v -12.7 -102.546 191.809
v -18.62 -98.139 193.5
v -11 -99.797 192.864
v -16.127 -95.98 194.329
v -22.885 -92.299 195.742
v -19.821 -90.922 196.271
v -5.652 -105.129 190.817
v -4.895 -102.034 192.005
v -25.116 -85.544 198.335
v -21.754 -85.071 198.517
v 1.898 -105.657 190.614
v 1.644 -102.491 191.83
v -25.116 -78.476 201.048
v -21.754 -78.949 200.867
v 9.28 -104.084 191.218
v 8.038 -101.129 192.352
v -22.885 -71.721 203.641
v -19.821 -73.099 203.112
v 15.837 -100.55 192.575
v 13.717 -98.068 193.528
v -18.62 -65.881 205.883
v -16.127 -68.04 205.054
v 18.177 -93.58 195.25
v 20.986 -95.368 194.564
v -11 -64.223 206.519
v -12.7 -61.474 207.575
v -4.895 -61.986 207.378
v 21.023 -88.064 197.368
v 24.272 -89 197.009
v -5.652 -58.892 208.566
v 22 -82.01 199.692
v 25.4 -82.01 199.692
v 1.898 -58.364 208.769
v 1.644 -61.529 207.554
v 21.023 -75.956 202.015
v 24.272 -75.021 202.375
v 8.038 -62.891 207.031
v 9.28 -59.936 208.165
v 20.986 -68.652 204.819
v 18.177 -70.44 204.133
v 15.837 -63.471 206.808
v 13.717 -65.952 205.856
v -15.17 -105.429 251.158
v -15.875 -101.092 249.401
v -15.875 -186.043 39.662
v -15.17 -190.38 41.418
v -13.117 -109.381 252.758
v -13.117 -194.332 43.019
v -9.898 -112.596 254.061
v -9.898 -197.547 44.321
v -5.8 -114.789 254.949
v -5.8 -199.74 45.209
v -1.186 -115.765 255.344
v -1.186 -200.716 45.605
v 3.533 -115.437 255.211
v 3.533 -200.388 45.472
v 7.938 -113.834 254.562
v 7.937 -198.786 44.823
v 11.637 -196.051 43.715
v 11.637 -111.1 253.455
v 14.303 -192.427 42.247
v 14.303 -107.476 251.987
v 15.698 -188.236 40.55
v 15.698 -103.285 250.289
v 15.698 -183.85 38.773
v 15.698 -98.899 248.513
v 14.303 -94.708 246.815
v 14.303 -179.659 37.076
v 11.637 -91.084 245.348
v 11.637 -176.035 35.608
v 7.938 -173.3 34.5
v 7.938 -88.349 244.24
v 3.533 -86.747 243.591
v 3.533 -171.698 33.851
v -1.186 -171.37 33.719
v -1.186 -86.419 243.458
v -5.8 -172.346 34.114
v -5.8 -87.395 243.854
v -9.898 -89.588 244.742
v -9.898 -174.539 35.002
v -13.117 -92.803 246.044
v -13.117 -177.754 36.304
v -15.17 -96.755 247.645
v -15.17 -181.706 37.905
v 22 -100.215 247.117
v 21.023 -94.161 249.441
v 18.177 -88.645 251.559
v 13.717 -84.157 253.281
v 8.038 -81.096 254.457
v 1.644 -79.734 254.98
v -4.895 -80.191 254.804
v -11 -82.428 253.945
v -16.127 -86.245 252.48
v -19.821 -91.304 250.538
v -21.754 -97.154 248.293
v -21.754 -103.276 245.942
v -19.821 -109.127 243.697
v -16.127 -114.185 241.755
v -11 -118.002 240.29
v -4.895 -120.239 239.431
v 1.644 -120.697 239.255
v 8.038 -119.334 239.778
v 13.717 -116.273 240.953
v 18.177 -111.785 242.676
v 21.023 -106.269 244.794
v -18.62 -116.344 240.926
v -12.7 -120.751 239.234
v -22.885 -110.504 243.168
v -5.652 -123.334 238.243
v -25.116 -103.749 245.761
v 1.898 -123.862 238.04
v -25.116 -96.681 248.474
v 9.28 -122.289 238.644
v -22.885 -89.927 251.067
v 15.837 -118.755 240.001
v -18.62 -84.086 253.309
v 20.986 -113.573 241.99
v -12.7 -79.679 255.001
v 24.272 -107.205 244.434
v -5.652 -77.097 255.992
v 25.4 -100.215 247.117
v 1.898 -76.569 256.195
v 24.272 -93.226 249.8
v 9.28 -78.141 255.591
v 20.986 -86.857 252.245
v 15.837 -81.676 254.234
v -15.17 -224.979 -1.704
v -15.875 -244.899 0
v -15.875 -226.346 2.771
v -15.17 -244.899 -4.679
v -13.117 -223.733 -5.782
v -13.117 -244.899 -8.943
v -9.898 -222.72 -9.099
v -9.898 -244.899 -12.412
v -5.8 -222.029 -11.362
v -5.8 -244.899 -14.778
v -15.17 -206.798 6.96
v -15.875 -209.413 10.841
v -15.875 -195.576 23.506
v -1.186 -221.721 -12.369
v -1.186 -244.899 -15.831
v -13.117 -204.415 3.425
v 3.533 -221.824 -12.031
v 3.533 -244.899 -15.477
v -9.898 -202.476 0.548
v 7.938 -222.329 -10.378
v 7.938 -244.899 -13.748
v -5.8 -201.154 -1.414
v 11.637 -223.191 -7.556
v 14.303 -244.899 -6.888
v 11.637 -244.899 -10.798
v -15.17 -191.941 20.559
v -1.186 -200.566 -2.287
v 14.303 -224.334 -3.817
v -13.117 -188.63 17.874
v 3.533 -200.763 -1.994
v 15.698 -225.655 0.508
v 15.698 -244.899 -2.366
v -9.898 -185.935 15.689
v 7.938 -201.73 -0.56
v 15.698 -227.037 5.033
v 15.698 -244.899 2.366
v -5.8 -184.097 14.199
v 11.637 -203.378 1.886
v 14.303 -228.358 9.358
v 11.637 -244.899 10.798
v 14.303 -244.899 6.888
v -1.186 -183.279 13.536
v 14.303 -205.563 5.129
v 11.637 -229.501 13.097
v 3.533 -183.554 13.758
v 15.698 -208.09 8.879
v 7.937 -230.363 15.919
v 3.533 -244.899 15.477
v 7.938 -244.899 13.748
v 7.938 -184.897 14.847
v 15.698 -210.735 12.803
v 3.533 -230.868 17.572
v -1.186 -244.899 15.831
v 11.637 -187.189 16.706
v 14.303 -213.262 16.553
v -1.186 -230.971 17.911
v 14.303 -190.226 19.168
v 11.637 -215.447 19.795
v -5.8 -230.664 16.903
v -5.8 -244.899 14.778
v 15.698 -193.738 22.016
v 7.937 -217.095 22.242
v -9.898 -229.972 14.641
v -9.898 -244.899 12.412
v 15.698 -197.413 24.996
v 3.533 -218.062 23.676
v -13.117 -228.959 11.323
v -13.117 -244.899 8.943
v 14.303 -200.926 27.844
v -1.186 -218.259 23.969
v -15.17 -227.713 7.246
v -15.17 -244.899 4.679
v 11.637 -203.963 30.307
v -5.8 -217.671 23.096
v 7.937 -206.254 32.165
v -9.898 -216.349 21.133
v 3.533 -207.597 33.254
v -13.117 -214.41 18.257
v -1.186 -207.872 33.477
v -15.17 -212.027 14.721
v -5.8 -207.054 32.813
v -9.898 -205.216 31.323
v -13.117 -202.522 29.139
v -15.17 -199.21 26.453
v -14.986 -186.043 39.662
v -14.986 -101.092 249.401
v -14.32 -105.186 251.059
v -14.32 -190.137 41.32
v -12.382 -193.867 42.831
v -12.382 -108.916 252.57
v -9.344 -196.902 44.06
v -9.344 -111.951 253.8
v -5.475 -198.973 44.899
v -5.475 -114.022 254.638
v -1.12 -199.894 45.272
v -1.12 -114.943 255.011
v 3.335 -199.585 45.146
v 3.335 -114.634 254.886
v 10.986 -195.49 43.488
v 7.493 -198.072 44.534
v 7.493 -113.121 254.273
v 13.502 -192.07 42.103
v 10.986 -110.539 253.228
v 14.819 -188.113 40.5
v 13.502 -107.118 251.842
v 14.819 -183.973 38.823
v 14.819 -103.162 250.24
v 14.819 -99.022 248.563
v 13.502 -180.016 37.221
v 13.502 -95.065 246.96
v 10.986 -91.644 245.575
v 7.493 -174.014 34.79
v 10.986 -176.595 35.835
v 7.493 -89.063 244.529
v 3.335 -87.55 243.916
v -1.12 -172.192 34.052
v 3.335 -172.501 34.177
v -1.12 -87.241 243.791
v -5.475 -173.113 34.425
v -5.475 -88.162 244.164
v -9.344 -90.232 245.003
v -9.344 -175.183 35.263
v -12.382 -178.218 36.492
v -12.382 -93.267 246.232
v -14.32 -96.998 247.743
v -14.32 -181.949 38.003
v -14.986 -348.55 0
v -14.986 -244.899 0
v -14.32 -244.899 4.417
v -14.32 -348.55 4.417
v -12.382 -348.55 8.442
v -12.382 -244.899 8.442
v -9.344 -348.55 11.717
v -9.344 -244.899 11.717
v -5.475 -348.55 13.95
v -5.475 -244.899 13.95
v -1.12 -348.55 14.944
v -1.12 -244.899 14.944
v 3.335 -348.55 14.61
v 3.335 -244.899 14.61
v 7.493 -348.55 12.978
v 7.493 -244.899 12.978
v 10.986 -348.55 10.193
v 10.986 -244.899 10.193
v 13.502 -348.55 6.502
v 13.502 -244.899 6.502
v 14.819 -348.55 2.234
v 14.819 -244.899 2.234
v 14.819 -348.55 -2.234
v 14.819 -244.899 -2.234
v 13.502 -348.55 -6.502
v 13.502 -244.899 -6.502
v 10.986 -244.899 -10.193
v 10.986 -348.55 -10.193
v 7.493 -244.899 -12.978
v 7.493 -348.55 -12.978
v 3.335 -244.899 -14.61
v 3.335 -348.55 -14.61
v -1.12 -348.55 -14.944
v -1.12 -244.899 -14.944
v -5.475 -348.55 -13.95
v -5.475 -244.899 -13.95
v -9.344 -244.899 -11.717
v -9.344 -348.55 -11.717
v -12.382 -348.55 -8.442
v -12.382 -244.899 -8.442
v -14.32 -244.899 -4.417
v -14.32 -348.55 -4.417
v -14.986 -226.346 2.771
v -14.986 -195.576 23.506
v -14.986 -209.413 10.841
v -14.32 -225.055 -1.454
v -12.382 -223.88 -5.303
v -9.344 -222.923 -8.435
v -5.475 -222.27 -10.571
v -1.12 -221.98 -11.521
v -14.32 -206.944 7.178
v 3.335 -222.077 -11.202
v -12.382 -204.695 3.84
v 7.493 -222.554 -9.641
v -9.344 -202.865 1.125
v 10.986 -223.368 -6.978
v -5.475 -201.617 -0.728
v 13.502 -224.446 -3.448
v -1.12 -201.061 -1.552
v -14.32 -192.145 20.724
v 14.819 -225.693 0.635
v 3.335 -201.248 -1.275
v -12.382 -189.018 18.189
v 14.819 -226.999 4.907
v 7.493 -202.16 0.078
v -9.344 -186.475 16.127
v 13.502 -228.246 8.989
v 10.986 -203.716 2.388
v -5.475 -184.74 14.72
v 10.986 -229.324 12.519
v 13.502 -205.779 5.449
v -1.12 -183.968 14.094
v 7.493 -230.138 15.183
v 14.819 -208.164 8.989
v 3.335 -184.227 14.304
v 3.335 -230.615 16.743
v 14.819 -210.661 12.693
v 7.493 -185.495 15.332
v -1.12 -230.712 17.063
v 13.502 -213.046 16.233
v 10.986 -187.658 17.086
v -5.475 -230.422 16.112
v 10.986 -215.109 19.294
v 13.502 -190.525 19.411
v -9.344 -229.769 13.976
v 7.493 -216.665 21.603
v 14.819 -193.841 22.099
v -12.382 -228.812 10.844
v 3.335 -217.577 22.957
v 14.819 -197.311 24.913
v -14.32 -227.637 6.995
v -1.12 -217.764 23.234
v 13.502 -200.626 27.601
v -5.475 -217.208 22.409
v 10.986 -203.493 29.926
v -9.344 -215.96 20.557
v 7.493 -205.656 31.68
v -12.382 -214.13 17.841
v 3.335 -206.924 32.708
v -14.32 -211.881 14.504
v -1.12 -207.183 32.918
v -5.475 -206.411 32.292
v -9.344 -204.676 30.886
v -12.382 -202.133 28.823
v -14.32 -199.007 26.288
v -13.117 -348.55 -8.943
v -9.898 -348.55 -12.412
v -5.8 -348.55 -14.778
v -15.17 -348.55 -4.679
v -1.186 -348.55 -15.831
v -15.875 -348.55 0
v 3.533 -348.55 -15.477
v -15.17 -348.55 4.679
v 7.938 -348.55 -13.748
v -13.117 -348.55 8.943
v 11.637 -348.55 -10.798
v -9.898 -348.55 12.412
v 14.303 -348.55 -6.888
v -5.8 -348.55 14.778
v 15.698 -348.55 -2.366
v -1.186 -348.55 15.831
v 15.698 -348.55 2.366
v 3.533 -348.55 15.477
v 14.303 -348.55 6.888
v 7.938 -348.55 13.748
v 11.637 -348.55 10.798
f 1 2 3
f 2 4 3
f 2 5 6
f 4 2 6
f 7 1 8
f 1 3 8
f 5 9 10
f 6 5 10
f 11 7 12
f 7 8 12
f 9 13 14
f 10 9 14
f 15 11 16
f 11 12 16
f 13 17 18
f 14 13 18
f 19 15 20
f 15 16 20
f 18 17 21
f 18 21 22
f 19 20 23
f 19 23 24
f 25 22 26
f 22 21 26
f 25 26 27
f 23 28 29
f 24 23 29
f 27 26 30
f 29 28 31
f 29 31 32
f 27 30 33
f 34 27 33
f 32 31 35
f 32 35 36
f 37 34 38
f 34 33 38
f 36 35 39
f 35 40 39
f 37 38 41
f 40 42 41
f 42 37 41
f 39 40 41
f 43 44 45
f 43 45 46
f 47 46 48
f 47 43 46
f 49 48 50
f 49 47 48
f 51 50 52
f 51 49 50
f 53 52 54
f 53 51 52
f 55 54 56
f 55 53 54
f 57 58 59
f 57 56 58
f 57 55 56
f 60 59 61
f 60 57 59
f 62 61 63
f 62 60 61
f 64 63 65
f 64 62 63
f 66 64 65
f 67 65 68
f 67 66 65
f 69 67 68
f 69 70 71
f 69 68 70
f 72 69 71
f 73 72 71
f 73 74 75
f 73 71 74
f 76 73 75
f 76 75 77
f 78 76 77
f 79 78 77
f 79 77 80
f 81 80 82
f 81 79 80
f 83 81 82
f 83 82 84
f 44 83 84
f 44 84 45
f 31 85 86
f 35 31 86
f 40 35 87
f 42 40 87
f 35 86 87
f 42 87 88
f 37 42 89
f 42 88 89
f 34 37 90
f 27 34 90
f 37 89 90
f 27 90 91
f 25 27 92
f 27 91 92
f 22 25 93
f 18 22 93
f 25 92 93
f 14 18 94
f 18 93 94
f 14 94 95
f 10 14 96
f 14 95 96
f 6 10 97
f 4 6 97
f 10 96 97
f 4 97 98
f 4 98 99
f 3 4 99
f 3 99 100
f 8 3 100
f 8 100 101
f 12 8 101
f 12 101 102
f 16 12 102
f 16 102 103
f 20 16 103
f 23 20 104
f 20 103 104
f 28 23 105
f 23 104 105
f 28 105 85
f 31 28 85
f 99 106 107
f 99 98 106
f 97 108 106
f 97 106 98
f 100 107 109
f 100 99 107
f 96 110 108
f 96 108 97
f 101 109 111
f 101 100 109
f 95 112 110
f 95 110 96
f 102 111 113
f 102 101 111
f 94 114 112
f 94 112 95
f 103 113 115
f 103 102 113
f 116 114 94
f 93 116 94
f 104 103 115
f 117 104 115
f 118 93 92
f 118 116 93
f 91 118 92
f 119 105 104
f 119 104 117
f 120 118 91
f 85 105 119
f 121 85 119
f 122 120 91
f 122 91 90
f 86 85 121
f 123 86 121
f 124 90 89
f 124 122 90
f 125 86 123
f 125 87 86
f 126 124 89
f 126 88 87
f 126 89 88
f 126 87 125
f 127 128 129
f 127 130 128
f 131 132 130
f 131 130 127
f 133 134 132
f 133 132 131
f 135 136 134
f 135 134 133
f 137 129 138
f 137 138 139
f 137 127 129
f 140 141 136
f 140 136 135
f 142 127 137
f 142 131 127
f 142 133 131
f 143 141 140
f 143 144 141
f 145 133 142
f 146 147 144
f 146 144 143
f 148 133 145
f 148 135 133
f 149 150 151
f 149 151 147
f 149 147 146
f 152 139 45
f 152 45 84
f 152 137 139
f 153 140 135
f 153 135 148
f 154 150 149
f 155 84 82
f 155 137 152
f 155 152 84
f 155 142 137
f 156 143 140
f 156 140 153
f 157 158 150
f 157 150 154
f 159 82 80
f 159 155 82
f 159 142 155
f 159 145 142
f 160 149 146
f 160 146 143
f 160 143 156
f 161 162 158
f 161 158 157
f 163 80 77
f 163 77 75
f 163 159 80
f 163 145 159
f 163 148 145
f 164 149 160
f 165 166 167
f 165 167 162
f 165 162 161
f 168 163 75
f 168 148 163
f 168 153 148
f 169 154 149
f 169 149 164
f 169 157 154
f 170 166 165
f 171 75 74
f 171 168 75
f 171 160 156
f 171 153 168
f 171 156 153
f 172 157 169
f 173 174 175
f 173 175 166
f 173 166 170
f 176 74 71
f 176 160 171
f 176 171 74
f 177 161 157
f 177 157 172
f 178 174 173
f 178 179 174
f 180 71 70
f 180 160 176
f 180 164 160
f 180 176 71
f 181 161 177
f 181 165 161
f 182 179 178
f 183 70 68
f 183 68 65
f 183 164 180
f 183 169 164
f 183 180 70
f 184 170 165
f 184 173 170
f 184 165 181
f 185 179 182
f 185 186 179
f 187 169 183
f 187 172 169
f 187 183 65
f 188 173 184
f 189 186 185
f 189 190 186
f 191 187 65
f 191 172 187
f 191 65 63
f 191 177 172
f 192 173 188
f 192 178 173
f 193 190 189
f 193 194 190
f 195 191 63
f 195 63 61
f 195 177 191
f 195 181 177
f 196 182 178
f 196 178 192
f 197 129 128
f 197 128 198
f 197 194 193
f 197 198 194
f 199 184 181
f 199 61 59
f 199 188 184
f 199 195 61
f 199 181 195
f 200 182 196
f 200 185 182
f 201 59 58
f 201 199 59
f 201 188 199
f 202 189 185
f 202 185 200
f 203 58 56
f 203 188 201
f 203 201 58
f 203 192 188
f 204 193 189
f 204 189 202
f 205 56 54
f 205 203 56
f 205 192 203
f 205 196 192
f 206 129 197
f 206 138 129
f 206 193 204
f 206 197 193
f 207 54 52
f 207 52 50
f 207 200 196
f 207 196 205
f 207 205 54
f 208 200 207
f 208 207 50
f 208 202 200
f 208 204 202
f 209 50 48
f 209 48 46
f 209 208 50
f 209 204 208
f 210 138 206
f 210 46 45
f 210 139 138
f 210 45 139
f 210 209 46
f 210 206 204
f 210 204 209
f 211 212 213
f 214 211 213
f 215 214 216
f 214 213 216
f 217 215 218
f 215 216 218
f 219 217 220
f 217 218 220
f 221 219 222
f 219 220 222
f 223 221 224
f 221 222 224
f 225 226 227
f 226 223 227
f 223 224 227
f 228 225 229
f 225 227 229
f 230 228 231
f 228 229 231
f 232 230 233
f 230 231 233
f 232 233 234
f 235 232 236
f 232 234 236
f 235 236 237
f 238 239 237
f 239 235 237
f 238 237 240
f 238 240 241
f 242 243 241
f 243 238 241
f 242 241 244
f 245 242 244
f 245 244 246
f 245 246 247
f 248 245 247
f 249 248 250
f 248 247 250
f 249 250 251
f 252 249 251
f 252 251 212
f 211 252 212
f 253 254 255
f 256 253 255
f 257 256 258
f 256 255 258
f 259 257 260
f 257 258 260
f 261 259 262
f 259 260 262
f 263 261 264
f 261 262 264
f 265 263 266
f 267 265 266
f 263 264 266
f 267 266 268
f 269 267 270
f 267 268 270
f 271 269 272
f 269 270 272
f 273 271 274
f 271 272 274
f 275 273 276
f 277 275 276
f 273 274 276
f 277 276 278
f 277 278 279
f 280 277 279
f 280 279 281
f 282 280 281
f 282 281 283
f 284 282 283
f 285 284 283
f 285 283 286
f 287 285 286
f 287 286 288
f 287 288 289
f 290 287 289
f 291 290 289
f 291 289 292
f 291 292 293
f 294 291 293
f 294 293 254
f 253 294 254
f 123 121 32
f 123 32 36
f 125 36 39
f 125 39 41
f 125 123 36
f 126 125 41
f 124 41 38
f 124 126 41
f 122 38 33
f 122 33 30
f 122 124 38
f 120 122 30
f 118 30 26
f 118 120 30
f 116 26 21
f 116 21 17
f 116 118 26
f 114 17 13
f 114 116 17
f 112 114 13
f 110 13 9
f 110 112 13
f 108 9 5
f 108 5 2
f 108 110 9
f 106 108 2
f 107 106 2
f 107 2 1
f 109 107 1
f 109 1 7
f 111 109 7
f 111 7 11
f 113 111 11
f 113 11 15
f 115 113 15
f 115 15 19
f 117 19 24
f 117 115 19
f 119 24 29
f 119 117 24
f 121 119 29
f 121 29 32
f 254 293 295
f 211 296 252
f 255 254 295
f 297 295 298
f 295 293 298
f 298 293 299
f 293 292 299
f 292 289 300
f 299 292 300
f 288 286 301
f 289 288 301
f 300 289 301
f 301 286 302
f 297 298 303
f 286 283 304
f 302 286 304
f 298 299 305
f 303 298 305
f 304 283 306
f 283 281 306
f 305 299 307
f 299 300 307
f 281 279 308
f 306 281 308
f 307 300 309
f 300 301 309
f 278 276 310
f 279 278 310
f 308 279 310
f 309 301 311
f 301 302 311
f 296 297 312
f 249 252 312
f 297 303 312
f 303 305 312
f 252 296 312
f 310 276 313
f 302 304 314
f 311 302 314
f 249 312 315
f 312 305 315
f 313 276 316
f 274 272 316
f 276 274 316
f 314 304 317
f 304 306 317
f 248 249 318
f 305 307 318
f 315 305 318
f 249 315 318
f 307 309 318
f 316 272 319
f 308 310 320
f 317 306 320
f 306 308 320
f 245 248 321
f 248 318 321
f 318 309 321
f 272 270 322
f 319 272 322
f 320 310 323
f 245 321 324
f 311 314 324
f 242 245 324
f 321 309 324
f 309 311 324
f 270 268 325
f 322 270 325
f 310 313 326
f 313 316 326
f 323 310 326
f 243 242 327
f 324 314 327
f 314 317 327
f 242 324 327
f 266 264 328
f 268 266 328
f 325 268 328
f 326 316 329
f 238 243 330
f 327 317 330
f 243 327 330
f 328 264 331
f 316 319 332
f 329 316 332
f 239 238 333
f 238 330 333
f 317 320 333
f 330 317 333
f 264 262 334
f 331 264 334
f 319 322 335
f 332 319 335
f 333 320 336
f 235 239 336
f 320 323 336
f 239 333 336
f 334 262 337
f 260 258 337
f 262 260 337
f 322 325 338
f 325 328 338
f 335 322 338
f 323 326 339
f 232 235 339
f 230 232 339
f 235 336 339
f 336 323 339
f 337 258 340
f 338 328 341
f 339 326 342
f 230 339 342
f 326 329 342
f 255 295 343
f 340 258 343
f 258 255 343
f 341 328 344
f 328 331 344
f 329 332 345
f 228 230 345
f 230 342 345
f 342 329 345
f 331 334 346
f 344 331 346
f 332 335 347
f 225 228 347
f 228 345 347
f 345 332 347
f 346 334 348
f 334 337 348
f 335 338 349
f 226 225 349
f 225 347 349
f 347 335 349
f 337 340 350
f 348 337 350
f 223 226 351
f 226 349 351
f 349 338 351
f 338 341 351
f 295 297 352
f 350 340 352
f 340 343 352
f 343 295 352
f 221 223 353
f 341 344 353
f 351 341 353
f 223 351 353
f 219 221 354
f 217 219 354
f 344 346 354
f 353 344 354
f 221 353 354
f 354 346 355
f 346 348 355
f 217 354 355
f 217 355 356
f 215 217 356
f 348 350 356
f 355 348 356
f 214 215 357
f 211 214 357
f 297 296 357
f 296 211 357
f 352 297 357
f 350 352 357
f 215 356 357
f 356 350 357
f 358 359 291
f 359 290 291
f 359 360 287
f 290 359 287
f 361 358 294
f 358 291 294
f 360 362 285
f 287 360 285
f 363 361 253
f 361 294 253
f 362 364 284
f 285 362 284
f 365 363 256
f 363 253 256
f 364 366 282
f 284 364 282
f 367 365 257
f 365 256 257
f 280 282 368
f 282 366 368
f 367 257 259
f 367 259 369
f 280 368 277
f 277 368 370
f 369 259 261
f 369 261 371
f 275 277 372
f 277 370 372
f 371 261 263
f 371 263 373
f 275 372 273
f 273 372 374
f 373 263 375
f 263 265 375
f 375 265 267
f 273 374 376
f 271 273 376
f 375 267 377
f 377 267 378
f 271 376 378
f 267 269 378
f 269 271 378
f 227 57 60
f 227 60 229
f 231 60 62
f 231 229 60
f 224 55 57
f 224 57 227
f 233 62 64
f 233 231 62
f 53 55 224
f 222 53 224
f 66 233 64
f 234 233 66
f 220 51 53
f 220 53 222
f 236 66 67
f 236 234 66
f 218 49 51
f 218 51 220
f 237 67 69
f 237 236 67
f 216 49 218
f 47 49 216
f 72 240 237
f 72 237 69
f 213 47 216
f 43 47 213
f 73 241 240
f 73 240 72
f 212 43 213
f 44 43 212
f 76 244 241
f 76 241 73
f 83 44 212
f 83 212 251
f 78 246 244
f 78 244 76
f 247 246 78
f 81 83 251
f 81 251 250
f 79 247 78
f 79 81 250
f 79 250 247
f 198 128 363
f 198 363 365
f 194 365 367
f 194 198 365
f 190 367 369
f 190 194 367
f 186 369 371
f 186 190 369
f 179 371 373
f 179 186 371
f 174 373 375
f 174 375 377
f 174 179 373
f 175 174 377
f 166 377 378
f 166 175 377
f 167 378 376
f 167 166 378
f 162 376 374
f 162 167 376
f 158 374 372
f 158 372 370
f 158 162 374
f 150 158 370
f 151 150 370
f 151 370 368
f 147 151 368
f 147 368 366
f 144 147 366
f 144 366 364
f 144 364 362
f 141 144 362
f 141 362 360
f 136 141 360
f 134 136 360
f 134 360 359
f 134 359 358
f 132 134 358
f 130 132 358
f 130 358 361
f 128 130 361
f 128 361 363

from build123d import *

# Parameters (mm, degrees)
F2_R     = 25.4
F2_R_2   = 22
F3_DEPTH = 50.8
F5_R     = 15.875
F5_R_2   = 14.986


with BuildPart() as f3:
    # F2 (on line) → F3 (new body, through all)
    with BuildSketch(Plane(origin=(0, -95.547330533, 248.9093059323), x_dir=(1, 0, 0), z_dir=(0, -0.3583679495, 0.9335804265))):
        with Locations((0, -5)):
            Circle(F2_R)
        with Locations((0, -5)):
            Circle(F2_R_2, mode=Mode.SUBTRACT)
    extrude(amount=-F3_DEPTH)


with BuildPart() as f7:
    # F7: sweep along a path in F6
    with BuildLine(Plane.YZ) as f7_path:
        Line((-348.55, 0), (-244.8985228166, 0))
        ThreePointArc((-244.8985228166, 0), (-209.412508215, 10.840786488), (-186.0429127507, 39.6616451119))
        Line((-186.0429127507, 39.6616451119), (-101.0918689449, 249.4011817698))
    # F5 (on line) → F7 (sweep)
    with BuildSketch(Plane(origin=(0, -348.55, 0), x_dir=(-1, 0, 0), z_dir=(0, 1, 0))):
        Circle(F5_R)
        Circle(F5_R_2, mode=Mode.SUBTRACT)
    sweep(path=f7_path.line)


solid = Compound([f3.part, f7.part])
